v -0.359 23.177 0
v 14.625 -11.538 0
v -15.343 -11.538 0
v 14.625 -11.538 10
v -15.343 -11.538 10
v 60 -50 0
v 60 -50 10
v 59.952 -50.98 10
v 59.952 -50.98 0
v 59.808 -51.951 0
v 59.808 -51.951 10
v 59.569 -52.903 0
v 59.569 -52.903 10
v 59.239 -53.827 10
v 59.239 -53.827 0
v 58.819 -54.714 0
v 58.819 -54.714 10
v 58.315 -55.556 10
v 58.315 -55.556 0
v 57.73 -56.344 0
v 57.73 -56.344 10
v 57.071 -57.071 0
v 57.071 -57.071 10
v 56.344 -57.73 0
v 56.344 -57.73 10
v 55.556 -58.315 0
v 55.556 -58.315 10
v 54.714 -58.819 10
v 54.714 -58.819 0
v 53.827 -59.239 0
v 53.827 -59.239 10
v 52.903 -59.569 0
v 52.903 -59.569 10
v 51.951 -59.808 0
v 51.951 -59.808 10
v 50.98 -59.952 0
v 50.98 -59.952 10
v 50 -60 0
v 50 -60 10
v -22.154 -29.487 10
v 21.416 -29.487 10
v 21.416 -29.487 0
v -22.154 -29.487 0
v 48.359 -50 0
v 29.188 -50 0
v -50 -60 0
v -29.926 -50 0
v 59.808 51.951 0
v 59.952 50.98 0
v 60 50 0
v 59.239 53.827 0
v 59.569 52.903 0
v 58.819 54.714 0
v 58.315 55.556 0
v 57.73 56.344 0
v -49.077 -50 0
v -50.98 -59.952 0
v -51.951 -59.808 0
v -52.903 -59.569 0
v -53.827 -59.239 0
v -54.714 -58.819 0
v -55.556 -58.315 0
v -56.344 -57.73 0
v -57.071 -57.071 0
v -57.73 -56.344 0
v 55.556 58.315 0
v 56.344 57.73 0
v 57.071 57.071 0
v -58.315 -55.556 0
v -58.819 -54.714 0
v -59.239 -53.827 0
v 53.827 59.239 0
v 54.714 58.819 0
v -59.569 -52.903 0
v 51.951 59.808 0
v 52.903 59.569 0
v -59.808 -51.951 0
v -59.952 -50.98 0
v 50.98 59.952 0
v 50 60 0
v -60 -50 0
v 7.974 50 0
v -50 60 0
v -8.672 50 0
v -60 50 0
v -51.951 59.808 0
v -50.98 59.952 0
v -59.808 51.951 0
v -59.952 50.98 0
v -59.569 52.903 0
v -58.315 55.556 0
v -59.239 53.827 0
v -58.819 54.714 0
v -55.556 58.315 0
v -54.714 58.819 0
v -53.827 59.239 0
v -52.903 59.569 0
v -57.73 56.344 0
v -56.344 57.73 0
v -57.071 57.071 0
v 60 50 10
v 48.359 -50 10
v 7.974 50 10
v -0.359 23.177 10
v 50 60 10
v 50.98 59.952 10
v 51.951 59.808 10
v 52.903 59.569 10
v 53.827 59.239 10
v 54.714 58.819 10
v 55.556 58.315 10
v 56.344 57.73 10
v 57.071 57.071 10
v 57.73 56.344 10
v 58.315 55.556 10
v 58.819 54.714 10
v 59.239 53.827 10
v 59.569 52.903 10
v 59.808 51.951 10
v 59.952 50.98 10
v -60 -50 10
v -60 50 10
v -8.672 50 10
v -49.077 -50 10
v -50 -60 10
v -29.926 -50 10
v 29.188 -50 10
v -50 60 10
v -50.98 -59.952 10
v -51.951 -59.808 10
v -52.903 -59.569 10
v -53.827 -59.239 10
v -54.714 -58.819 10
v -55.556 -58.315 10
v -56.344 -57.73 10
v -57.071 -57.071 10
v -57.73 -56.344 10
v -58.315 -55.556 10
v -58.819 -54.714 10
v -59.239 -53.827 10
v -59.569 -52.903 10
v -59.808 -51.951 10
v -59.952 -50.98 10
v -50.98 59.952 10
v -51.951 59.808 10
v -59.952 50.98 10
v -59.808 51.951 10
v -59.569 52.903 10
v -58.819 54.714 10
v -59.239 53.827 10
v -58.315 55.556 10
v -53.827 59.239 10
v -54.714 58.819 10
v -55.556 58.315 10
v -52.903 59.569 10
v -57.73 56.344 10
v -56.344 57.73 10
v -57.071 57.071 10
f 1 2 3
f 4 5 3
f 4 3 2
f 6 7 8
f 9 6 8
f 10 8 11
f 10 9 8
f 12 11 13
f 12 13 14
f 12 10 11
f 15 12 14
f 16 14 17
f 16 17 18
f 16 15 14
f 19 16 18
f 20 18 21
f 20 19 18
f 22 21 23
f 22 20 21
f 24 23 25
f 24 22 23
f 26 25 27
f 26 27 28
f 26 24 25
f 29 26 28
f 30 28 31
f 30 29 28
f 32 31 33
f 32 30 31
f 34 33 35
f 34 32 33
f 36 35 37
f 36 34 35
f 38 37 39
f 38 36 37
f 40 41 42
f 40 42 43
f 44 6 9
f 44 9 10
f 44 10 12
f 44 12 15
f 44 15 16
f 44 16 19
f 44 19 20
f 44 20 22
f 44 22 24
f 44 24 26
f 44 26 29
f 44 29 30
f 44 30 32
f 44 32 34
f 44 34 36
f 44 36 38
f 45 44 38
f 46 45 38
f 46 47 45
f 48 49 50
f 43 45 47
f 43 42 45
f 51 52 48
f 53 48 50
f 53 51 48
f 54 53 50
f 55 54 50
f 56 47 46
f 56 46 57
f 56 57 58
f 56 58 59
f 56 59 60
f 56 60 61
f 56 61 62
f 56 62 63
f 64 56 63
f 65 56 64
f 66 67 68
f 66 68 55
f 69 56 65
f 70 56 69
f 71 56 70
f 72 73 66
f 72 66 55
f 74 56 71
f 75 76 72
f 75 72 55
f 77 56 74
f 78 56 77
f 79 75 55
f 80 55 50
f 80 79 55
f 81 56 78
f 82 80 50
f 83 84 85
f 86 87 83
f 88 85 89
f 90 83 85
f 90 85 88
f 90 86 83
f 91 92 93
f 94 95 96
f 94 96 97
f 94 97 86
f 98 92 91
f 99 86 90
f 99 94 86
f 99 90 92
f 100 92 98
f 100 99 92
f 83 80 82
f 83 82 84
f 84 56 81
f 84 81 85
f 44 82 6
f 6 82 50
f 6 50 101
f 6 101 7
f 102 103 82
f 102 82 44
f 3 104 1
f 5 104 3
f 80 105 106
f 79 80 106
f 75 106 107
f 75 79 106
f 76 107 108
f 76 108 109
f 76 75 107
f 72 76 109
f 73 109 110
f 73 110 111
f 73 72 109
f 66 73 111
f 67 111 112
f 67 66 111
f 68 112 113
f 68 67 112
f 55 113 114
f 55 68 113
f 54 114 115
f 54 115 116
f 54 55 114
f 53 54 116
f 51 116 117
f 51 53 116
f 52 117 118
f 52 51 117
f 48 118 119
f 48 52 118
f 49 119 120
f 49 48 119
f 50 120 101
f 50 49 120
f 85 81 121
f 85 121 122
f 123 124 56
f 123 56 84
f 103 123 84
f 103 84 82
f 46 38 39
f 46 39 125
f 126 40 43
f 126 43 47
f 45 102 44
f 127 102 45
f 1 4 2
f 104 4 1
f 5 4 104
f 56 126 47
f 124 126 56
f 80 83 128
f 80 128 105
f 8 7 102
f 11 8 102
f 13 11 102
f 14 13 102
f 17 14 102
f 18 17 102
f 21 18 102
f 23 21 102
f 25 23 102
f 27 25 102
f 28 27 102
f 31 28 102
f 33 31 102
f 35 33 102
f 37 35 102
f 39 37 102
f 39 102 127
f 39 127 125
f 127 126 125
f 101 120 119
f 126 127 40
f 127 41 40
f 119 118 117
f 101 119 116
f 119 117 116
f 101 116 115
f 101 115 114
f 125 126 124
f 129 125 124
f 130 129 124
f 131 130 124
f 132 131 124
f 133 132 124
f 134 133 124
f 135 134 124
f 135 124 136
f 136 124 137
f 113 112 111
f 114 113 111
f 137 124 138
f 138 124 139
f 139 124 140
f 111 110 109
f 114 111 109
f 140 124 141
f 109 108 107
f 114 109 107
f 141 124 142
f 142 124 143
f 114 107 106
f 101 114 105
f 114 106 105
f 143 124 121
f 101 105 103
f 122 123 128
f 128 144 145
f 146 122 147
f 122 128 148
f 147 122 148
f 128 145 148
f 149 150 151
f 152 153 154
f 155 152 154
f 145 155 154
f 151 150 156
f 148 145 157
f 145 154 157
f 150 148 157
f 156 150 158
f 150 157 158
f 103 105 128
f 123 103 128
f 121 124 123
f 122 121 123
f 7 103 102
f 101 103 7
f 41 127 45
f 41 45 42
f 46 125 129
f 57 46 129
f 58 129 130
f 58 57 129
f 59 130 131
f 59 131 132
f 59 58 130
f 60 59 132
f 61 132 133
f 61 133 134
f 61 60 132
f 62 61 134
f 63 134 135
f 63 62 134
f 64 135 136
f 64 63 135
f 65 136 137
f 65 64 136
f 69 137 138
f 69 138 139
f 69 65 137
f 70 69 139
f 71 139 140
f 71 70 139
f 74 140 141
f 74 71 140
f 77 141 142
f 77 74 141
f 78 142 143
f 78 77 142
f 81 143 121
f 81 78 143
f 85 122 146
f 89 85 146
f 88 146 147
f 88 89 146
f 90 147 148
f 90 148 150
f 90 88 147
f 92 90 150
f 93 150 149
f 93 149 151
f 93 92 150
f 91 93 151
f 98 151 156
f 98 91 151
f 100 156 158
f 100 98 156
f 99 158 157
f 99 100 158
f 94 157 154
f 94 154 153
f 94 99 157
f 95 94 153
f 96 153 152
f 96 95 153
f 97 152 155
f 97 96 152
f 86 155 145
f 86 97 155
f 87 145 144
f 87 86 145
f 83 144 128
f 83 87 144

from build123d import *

# Parameters (mm, degrees)
BOSS_EXTRUDE1_DEPTH = 10
CUT_EXTRUDE14_DEPTH = 10


with BuildPart() as part:
    # Sketch1 → Boss-Extrude1 (new body)
    with BuildSketch(Plane.XY):
        with BuildLine():
            Line((-50, 60), (50, 60))
            ThreePointArc((50, 60), (57.071067812, 57.071067812), (60, 50))
            Line((60, 50), (60, -50))
            ThreePointArc((60, -50), (57.071067812, -57.071067812), (50, -60))
            Line((50, -60), (-50, -60))
            ThreePointArc((-50, -60), (-57.071067812, -57.071067812), (-60, -50))
            Line((-60, -50), (-60, 50))
            ThreePointArc((-60, 50), (-57.071067812, 57.071067812), (-50, 60))
        make_face()
    extrude(amount=BOSS_EXTRUDE1_DEPTH)

    # Sketch2 → Cut-Extrude14 (cut)
    with BuildSketch(Plane.XY.offset(10)):
        Polygon((-8.672275641, 50), (7.974358974, 50), (48.358974359, -50), (29.188301282, -50), (21.415865385, -29.487179487), (-22.153846154, -29.487179487), (-29.926282051, -50), (-49.076923077, -50), align=None)
        Polygon((-0.358974359, 23.177083333), (-15.342948718, -11.538461538), (14.625, -11.538461538), align=None, mode=Mode.SUBTRACT)
    extrude(amount=-CUT_EXTRUDE14_DEPTH, mode=Mode.SUBTRACT)


with BuildPart() as cut_extrude14_piece_1:
    # of the separate pieces the step leaves, piece 1, a body of its own (cut_extrude14_pieces)
    add(part.part.solids().sort_by_distance((-50, 60, 0))[0])


with BuildPart() as cut_extrude14_piece_2:
    # of the separate pieces the step leaves, piece 2, a body of its own (cut_extrude14_pieces)
    add(part.part.solids().sort_by_distance((-0.358974359, 23.177083333, 0))[0])


solid = Compound([cut_extrude14_piece_1.part, cut_extrude14_piece_2.part])
